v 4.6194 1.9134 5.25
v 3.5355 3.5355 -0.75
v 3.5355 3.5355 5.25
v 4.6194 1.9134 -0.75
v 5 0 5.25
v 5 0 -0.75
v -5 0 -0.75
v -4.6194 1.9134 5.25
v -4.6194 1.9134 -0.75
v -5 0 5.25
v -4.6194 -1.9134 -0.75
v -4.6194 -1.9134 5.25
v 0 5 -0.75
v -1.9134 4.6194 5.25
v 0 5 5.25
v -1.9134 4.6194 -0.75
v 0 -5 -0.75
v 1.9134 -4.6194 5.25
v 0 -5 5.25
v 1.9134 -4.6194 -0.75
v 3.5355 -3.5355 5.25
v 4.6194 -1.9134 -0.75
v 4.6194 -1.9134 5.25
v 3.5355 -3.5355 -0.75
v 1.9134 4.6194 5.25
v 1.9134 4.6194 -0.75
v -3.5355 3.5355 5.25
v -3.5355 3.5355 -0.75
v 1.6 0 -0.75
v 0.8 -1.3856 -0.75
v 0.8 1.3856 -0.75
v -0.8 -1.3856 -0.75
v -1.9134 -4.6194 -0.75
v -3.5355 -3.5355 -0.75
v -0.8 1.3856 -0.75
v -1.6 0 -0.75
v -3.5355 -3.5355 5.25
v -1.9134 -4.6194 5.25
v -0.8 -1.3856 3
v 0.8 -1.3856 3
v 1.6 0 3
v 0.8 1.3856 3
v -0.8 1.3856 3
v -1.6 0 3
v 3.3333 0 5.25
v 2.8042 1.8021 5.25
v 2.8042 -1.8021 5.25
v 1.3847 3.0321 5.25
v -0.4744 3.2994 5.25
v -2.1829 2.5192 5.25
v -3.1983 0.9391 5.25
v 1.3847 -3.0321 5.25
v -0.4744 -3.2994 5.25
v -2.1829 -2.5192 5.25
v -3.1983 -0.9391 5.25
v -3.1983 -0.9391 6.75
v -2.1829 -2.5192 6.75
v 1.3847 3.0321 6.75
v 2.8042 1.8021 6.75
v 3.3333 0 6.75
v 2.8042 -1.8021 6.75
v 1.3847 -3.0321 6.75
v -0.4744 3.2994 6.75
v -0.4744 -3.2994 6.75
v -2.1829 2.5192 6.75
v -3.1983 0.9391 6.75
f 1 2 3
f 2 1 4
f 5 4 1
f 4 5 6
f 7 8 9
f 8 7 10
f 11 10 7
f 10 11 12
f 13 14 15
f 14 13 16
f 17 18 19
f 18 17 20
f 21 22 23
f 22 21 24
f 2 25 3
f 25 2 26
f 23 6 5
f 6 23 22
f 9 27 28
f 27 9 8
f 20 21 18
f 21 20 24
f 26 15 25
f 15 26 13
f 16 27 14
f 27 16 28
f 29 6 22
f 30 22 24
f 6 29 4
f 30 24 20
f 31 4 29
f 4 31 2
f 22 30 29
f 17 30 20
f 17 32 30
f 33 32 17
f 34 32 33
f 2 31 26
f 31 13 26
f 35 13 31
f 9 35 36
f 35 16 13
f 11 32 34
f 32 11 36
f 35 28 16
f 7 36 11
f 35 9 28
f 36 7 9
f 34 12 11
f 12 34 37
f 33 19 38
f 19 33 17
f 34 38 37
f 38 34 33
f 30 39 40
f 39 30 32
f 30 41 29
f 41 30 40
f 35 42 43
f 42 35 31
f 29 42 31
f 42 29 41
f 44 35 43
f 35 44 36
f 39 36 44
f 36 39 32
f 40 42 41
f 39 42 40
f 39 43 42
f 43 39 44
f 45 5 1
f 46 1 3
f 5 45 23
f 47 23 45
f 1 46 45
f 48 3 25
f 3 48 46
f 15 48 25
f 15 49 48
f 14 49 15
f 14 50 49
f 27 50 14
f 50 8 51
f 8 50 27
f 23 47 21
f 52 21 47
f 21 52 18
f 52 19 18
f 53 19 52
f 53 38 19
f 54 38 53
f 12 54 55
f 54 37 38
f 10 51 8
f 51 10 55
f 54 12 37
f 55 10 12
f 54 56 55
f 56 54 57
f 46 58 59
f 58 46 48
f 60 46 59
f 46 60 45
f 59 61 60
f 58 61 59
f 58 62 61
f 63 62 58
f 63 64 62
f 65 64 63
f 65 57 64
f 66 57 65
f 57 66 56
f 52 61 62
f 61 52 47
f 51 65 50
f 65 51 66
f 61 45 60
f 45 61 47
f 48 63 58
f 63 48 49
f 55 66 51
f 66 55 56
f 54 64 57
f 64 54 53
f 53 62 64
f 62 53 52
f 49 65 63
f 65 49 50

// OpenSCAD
// Parameters
inner_diameter_mm = 3; //[1.5:6:0.1]
outer_diameter_mm = 10; //[5:20:0.1]
thickness_mm = 1.5; //[0.75:3:0.05]
clearance_mm = 0.2; //[0:0.6:0.05]
overlap_mm = 0.8; //[0.5:2:0.1]

// Washer - base geometry
module washer() {
  difference() {
    cylinder(r=outer_diameter_mm/2, h=thickness_mm, center=true);
    cylinder(r=(inner_diameter_mm + clearance_mm)/2, h=thickness_mm + 2*overlap_mm, center=true);
  }
}

// Round Grommet Top - detailed geometry
module round_grommet_top() {
  color([0.2, 0.2, 0.2]) { // Rubber-like color
    washer();
  }
}

// Round Grommet Assembly - detailed geometry
module round_grommet_assembly() {
  color([0.2, 0.2, 0.2]) { // Rubber-like color
    washer();
  }
}

// Nut And Washer - detailed geometry
module nut_and_washer() {
  color([0.4, 0.4, 0.43]) { // Steel-like color
    union() {
      washer();
      translate([0, 0, thickness_mm/2]) cylinder(r=outer_diameter_mm/2.5, h=thickness_mm, center=true);
    }
  }
}

// Screw And Washer - detailed geometry
module screw_and_washer() {
  color([0.4, 0.4, 0.43]) { // Steel-like color
    union() {
      washer();
      translate([0, 0, thickness_mm/2]) cylinder(r=outer_diameter_mm/3, h=thickness_mm*2, center=true);
    }
  }
}

// Assembly - combines all parts
module assembly() {
  translate([0, 0, 0]) round_grommet_top();
  translate([0, 0, thickness_mm]) round_grommet_assembly();
  translate([0, 0, thickness_mm*2]) nut_and_washer();
  translate([0, 0, thickness_mm*3]) screw_and_washer();
}

// Final assembly call
assembly();
